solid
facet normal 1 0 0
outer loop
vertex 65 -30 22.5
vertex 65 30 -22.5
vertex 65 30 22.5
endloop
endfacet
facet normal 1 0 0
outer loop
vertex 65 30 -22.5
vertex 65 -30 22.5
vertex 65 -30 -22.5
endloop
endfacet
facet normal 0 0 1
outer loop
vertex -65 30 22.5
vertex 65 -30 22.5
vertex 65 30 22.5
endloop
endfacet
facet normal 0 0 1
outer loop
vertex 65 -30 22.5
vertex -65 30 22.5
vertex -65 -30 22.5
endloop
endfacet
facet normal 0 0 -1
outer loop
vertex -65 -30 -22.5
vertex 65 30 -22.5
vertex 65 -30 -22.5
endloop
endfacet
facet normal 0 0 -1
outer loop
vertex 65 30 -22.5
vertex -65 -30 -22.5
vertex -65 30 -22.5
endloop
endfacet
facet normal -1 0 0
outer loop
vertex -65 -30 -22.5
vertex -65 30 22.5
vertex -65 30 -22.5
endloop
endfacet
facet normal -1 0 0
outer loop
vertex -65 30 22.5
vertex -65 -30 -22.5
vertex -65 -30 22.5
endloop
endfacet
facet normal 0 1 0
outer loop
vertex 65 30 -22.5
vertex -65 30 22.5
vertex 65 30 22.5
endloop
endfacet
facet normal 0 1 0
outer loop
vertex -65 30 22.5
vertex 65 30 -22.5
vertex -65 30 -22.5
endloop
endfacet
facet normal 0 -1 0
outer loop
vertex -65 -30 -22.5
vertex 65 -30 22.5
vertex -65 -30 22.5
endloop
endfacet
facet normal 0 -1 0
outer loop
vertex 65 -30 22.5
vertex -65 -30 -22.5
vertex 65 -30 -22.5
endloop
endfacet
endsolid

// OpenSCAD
// Dimensions (mm)
block_length_x = 130;
block_depth_y = 60;
block_height_z = 45;

// Hole parameters
hole_diameter = 17.5;
hole_depth = 40;
hole_spacing_x = 24;
num_holes = 5;

// Tilt parameters
tilt_angle = 30; // degrees from vertical
top_face_y_offset = -10; // Y position on top face where axis intersects

// Rendering quality
$fn = 64;

// Main block centered at origin in X/Y, resting on z=0
// Block spans X: -65 to 65, Y: -30 to 30, Z: 0 to 45
difference() {
    // Solid block
    translate([0, 0, 0])
    cube([block_length_x, block_depth_y, block_height_z], center = true);
    
    // Holes
    for (i = [-(num_holes-1)/2 : (num_holes-1)/2]) {
        x_pos = i * hole_spacing_x;
        
        // The axis intersects the top face at (x_pos, top_face_y_offset, block_height_z)
        // Top face is at z = block_height_z = 45
        top_center = [x_pos, top_face_y_offset, block_height_z];
        
        // The hole is tilted 30 degrees from vertical in the YZ plane, moving toward +Y as it goes down
        // We create a cylinder along the Z axis, then rotate it around the X axis by tilt_angle
        // This tilts the cylinder toward +Y
        
        // The cylinder needs to extend past the block to ensure clean cutting
        // Depth is 40mm along the axis, so we make it slightly longer (41mm)
        // We also need to ensure it extends past the bottom of the block in Z
        
        translate(top_center)
        rotate([tilt_angle, 0, 0])
        cylinder(r = hole_diameter/2, h = hole_depth + 1, center = false);
    }
}
